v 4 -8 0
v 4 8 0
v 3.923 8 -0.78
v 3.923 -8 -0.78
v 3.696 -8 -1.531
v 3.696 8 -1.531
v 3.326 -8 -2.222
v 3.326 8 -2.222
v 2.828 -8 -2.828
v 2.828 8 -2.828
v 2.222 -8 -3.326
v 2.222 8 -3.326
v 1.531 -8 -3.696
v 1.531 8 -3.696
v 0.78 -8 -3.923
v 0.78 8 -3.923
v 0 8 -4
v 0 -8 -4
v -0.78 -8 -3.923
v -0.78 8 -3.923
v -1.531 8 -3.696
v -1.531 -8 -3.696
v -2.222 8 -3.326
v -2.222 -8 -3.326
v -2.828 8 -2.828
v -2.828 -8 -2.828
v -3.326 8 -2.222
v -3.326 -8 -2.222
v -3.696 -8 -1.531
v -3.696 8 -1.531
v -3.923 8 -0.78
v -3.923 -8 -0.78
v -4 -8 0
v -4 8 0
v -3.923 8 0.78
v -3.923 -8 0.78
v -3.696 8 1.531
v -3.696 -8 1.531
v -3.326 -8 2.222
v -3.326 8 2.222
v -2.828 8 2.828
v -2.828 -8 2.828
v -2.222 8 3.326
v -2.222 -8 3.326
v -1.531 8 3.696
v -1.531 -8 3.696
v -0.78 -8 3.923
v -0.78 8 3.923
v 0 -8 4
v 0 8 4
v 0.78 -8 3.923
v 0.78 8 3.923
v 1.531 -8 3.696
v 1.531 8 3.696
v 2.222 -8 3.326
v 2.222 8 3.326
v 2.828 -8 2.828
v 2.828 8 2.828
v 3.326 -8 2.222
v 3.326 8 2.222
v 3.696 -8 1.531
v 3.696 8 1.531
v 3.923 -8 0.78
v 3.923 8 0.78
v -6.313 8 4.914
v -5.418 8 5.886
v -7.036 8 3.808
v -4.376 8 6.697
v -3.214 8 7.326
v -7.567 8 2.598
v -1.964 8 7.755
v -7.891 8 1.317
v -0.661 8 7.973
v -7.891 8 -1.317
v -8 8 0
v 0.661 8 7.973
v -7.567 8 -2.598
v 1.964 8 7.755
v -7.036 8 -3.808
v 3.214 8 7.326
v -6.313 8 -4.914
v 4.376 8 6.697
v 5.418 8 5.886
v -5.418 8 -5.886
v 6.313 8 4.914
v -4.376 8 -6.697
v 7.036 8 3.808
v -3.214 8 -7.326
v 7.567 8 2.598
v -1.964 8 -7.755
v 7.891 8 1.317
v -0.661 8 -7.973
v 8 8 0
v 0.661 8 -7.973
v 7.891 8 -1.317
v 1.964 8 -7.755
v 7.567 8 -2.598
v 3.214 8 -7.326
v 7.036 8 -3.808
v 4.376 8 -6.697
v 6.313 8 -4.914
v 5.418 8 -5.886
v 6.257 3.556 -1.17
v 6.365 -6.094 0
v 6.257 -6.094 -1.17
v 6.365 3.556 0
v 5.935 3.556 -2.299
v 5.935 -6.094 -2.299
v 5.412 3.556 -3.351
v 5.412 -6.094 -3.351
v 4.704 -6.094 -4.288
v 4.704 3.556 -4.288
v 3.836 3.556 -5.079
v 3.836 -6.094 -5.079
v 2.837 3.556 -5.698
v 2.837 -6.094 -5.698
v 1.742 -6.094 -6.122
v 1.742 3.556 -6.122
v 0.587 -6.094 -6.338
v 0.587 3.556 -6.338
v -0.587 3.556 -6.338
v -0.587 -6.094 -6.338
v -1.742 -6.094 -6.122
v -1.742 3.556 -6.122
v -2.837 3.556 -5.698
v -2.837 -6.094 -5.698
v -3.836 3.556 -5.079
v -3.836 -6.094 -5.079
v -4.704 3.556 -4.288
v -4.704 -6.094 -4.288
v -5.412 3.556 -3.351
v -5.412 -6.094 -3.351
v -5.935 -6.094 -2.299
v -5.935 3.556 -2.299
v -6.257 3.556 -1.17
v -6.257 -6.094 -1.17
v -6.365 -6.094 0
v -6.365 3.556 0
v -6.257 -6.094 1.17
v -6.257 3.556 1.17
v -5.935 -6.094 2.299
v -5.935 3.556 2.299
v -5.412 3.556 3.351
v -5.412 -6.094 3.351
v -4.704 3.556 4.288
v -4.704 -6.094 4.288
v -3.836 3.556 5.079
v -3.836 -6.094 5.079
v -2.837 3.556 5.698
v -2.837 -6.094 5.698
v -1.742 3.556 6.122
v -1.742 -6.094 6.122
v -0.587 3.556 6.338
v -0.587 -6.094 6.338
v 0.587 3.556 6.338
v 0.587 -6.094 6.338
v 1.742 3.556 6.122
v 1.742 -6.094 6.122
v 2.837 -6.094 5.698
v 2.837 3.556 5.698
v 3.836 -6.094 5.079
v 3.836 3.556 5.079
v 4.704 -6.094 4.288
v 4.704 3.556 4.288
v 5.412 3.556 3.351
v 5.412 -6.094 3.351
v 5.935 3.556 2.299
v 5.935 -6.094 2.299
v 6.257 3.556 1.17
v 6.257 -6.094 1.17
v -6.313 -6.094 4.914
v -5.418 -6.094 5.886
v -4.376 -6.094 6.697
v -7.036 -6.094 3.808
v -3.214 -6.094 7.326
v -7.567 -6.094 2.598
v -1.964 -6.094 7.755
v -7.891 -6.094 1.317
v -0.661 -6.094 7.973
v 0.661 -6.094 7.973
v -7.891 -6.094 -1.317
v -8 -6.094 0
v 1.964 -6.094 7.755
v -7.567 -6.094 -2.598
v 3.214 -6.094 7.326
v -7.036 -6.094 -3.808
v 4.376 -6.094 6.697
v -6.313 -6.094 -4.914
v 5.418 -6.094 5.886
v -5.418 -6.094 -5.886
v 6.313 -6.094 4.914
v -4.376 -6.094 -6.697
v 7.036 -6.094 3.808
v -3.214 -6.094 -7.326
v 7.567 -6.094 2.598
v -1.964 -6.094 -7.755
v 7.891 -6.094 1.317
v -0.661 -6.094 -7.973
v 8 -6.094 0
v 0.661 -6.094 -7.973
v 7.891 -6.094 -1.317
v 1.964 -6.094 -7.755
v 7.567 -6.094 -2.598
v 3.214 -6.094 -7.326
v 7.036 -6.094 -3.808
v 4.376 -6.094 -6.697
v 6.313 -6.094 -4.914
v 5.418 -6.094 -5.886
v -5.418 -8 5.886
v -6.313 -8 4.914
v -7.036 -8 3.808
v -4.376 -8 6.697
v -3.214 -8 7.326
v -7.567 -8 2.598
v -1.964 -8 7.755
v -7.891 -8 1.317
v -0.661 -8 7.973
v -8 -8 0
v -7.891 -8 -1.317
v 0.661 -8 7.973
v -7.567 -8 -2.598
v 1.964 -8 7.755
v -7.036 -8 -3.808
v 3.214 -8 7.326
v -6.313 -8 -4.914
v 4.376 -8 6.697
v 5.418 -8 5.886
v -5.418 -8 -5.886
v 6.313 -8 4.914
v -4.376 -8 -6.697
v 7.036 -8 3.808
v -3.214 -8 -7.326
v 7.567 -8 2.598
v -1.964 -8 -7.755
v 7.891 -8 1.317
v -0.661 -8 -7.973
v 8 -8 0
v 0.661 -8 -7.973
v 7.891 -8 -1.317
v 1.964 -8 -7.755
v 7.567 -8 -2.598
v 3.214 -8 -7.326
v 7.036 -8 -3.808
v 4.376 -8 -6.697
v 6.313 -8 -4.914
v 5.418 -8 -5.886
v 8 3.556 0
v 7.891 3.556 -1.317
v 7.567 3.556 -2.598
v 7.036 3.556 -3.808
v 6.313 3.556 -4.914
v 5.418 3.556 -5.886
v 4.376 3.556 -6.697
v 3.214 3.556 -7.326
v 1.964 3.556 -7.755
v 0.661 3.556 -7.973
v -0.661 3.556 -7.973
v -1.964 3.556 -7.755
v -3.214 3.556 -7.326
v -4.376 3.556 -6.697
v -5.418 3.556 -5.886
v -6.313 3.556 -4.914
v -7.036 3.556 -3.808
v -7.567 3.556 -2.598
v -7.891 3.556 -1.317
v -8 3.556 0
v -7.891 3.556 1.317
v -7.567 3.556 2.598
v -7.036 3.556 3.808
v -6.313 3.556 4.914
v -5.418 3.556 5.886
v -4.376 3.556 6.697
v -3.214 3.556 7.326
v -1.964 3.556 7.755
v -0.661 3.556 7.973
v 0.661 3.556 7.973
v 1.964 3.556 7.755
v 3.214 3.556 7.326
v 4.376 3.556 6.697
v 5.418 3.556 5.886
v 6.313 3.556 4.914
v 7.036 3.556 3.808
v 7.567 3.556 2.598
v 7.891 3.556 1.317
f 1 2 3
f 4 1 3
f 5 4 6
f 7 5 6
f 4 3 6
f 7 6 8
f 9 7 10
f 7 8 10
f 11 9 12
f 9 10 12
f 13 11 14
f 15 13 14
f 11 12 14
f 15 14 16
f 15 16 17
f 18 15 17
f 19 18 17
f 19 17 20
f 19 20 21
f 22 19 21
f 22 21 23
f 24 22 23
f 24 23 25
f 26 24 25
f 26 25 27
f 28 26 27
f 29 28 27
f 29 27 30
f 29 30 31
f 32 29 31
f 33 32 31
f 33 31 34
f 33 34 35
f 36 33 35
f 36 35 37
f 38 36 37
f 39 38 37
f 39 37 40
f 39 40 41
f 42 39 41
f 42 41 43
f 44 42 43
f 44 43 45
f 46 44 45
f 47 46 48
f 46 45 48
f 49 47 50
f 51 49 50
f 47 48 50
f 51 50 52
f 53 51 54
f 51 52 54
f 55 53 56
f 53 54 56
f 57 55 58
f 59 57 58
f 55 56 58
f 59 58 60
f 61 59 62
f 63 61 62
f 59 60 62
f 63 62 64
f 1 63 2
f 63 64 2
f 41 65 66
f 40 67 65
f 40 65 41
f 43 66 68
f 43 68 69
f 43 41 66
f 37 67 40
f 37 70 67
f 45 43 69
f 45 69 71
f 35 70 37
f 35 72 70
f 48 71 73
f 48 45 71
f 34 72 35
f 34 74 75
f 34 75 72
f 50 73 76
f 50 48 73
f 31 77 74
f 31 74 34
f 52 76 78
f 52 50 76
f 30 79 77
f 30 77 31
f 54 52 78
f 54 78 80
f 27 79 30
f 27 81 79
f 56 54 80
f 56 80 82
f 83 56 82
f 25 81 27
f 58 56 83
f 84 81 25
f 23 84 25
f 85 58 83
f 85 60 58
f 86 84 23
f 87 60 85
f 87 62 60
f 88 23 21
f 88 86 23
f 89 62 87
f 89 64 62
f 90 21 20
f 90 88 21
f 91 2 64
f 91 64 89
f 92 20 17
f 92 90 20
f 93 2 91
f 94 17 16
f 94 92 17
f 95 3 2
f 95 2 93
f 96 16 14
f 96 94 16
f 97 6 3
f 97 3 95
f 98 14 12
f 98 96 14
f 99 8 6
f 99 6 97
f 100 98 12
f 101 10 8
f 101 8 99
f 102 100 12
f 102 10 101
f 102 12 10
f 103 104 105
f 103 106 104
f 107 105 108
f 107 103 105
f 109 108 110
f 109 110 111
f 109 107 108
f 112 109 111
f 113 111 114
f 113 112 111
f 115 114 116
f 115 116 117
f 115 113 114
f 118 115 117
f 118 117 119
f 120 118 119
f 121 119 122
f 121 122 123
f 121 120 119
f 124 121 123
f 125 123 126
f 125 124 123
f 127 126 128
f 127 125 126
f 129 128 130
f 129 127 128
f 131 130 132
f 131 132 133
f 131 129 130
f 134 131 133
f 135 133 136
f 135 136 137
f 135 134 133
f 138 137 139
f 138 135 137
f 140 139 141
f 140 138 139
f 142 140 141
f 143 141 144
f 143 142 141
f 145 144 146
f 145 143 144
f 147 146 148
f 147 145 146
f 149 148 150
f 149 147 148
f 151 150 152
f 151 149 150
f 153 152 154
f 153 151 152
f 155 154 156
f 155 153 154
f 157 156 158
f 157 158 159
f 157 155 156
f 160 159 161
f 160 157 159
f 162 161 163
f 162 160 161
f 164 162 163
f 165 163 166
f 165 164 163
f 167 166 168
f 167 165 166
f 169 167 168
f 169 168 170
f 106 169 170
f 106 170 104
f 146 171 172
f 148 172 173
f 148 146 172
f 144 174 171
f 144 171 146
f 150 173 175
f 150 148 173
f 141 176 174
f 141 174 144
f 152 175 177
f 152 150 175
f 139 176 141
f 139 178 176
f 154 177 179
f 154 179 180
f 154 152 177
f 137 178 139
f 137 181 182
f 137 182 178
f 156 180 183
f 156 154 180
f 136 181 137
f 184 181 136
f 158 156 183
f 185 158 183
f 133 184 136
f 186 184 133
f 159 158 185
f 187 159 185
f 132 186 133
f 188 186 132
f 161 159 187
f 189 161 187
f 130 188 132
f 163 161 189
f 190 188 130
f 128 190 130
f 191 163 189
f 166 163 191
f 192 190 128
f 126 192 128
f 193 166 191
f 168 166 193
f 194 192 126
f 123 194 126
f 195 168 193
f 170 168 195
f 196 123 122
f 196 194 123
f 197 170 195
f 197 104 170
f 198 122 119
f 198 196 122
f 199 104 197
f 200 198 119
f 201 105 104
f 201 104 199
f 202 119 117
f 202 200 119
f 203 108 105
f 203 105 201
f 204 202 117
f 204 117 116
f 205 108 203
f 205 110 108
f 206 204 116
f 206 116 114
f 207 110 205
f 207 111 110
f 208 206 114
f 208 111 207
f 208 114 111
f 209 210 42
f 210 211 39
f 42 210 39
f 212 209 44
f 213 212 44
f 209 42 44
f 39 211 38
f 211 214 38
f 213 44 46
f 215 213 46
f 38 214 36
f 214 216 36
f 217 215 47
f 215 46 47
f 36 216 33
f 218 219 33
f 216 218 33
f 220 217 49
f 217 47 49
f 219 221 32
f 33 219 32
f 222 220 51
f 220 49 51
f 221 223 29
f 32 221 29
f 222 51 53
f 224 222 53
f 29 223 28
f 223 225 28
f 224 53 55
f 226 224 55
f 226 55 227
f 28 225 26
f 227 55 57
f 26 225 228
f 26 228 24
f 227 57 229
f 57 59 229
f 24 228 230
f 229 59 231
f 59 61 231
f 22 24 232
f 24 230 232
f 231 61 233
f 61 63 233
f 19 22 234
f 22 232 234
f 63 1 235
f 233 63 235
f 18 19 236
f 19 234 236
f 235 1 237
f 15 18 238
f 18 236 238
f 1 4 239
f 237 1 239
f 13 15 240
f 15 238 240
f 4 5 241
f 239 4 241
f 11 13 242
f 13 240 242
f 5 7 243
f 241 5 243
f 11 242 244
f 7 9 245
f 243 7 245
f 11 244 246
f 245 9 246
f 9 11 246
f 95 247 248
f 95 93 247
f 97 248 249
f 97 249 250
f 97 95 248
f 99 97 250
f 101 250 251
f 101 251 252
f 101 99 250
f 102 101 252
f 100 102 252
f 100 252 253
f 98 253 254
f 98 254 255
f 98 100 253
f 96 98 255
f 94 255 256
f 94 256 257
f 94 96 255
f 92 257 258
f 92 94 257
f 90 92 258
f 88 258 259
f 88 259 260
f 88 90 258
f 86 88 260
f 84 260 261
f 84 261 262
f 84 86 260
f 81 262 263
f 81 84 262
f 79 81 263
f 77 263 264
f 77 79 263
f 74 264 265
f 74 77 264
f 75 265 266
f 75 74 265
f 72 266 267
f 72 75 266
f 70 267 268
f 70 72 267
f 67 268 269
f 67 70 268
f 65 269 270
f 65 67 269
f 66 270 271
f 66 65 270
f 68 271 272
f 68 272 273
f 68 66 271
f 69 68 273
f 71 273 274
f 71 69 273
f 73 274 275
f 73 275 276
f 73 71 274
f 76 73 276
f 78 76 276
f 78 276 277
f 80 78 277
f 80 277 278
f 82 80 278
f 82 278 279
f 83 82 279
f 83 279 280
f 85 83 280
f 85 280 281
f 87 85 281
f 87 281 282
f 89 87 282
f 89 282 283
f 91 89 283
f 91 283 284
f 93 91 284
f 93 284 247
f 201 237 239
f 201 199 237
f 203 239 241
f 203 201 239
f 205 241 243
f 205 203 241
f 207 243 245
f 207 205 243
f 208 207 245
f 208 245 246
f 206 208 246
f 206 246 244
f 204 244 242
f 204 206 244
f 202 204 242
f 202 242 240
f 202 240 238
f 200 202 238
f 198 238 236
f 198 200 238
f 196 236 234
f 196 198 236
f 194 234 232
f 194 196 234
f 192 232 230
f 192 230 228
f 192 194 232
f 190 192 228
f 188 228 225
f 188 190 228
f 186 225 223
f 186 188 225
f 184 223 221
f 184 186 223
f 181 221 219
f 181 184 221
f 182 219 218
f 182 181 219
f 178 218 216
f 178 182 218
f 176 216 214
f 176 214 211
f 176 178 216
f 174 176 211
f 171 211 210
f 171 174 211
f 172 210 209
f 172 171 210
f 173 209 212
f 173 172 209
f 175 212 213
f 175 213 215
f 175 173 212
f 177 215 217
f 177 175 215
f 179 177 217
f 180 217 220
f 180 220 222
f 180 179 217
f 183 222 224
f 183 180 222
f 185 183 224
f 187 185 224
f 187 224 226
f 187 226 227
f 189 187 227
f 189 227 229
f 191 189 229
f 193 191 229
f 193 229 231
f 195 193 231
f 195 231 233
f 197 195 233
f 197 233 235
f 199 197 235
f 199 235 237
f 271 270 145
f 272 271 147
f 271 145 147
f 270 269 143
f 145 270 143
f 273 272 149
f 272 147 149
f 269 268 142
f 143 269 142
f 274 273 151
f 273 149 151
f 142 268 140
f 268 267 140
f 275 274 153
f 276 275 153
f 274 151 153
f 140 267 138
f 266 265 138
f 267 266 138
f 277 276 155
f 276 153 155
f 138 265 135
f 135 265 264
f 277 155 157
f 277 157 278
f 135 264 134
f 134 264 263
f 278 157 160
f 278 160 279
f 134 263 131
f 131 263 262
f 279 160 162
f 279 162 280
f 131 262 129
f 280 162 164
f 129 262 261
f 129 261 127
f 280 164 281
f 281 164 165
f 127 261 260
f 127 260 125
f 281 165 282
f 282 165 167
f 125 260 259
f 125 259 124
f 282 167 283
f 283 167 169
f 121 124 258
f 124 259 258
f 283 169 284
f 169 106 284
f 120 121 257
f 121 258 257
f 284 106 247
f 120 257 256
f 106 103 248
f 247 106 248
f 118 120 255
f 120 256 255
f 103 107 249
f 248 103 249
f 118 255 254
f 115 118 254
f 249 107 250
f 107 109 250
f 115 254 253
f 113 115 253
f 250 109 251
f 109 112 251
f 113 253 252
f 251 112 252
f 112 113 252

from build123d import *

# Parameters (mm, degrees)
BOSS_EXTRUDE1_DEPTH      = 8
BOSS_EXTRUDE1_DEPTH_BACK = 8
SKETCH1_R                = 8
CUT_EXTRUDE1_DEPTH       = 3.556
CUT_EXTRUDE1_DEPTH_BACK  = 6.094
SKETCH2_R                = 8
SKETCH2_R_2              = 6.36499997
SKETCH3_R                = 4
CUT_EXTRUDE2_DEPTH       = 20.595917942


with BuildPart() as part:
    # Sketch1 → Boss-Extrude1 (new, two sides: drawn at the far end of the back side and taken through both)
    with BuildSketch(Plane(origin=(0, 0, 0), x_dir=(1, 0, 0), z_dir=(0, 1, 0)).offset(-BOSS_EXTRUDE1_DEPTH_BACK)):
        Circle(SKETCH1_R)
    extrude(amount=BOSS_EXTRUDE1_DEPTH + BOSS_EXTRUDE1_DEPTH_BACK)

    # Sketch2 → Cut-Extrude1 (cut, two sides: drawn at the far end of the back side and taken through both)
    with BuildSketch(Plane(origin=(0, 0, 0), x_dir=(1, 0, 0), z_dir=(0, 1, 0)).offset(-CUT_EXTRUDE1_DEPTH_BACK)):
        Circle(SKETCH2_R)
        Circle(SKETCH2_R_2, mode=Mode.SUBTRACT)
    extrude(amount=CUT_EXTRUDE1_DEPTH + CUT_EXTRUDE1_DEPTH_BACK, mode=Mode.SUBTRACT)

    # Sketch3 → Cut-Extrude2 (cut, through all)
    with BuildSketch(Plane(origin=(0, 8, 0), x_dir=(1, 0, 0), z_dir=(0, 1, 0))):
        Circle(SKETCH3_R)
    extrude(amount=-CUT_EXTRUDE2_DEPTH, mode=Mode.SUBTRACT)


solid = part.part
